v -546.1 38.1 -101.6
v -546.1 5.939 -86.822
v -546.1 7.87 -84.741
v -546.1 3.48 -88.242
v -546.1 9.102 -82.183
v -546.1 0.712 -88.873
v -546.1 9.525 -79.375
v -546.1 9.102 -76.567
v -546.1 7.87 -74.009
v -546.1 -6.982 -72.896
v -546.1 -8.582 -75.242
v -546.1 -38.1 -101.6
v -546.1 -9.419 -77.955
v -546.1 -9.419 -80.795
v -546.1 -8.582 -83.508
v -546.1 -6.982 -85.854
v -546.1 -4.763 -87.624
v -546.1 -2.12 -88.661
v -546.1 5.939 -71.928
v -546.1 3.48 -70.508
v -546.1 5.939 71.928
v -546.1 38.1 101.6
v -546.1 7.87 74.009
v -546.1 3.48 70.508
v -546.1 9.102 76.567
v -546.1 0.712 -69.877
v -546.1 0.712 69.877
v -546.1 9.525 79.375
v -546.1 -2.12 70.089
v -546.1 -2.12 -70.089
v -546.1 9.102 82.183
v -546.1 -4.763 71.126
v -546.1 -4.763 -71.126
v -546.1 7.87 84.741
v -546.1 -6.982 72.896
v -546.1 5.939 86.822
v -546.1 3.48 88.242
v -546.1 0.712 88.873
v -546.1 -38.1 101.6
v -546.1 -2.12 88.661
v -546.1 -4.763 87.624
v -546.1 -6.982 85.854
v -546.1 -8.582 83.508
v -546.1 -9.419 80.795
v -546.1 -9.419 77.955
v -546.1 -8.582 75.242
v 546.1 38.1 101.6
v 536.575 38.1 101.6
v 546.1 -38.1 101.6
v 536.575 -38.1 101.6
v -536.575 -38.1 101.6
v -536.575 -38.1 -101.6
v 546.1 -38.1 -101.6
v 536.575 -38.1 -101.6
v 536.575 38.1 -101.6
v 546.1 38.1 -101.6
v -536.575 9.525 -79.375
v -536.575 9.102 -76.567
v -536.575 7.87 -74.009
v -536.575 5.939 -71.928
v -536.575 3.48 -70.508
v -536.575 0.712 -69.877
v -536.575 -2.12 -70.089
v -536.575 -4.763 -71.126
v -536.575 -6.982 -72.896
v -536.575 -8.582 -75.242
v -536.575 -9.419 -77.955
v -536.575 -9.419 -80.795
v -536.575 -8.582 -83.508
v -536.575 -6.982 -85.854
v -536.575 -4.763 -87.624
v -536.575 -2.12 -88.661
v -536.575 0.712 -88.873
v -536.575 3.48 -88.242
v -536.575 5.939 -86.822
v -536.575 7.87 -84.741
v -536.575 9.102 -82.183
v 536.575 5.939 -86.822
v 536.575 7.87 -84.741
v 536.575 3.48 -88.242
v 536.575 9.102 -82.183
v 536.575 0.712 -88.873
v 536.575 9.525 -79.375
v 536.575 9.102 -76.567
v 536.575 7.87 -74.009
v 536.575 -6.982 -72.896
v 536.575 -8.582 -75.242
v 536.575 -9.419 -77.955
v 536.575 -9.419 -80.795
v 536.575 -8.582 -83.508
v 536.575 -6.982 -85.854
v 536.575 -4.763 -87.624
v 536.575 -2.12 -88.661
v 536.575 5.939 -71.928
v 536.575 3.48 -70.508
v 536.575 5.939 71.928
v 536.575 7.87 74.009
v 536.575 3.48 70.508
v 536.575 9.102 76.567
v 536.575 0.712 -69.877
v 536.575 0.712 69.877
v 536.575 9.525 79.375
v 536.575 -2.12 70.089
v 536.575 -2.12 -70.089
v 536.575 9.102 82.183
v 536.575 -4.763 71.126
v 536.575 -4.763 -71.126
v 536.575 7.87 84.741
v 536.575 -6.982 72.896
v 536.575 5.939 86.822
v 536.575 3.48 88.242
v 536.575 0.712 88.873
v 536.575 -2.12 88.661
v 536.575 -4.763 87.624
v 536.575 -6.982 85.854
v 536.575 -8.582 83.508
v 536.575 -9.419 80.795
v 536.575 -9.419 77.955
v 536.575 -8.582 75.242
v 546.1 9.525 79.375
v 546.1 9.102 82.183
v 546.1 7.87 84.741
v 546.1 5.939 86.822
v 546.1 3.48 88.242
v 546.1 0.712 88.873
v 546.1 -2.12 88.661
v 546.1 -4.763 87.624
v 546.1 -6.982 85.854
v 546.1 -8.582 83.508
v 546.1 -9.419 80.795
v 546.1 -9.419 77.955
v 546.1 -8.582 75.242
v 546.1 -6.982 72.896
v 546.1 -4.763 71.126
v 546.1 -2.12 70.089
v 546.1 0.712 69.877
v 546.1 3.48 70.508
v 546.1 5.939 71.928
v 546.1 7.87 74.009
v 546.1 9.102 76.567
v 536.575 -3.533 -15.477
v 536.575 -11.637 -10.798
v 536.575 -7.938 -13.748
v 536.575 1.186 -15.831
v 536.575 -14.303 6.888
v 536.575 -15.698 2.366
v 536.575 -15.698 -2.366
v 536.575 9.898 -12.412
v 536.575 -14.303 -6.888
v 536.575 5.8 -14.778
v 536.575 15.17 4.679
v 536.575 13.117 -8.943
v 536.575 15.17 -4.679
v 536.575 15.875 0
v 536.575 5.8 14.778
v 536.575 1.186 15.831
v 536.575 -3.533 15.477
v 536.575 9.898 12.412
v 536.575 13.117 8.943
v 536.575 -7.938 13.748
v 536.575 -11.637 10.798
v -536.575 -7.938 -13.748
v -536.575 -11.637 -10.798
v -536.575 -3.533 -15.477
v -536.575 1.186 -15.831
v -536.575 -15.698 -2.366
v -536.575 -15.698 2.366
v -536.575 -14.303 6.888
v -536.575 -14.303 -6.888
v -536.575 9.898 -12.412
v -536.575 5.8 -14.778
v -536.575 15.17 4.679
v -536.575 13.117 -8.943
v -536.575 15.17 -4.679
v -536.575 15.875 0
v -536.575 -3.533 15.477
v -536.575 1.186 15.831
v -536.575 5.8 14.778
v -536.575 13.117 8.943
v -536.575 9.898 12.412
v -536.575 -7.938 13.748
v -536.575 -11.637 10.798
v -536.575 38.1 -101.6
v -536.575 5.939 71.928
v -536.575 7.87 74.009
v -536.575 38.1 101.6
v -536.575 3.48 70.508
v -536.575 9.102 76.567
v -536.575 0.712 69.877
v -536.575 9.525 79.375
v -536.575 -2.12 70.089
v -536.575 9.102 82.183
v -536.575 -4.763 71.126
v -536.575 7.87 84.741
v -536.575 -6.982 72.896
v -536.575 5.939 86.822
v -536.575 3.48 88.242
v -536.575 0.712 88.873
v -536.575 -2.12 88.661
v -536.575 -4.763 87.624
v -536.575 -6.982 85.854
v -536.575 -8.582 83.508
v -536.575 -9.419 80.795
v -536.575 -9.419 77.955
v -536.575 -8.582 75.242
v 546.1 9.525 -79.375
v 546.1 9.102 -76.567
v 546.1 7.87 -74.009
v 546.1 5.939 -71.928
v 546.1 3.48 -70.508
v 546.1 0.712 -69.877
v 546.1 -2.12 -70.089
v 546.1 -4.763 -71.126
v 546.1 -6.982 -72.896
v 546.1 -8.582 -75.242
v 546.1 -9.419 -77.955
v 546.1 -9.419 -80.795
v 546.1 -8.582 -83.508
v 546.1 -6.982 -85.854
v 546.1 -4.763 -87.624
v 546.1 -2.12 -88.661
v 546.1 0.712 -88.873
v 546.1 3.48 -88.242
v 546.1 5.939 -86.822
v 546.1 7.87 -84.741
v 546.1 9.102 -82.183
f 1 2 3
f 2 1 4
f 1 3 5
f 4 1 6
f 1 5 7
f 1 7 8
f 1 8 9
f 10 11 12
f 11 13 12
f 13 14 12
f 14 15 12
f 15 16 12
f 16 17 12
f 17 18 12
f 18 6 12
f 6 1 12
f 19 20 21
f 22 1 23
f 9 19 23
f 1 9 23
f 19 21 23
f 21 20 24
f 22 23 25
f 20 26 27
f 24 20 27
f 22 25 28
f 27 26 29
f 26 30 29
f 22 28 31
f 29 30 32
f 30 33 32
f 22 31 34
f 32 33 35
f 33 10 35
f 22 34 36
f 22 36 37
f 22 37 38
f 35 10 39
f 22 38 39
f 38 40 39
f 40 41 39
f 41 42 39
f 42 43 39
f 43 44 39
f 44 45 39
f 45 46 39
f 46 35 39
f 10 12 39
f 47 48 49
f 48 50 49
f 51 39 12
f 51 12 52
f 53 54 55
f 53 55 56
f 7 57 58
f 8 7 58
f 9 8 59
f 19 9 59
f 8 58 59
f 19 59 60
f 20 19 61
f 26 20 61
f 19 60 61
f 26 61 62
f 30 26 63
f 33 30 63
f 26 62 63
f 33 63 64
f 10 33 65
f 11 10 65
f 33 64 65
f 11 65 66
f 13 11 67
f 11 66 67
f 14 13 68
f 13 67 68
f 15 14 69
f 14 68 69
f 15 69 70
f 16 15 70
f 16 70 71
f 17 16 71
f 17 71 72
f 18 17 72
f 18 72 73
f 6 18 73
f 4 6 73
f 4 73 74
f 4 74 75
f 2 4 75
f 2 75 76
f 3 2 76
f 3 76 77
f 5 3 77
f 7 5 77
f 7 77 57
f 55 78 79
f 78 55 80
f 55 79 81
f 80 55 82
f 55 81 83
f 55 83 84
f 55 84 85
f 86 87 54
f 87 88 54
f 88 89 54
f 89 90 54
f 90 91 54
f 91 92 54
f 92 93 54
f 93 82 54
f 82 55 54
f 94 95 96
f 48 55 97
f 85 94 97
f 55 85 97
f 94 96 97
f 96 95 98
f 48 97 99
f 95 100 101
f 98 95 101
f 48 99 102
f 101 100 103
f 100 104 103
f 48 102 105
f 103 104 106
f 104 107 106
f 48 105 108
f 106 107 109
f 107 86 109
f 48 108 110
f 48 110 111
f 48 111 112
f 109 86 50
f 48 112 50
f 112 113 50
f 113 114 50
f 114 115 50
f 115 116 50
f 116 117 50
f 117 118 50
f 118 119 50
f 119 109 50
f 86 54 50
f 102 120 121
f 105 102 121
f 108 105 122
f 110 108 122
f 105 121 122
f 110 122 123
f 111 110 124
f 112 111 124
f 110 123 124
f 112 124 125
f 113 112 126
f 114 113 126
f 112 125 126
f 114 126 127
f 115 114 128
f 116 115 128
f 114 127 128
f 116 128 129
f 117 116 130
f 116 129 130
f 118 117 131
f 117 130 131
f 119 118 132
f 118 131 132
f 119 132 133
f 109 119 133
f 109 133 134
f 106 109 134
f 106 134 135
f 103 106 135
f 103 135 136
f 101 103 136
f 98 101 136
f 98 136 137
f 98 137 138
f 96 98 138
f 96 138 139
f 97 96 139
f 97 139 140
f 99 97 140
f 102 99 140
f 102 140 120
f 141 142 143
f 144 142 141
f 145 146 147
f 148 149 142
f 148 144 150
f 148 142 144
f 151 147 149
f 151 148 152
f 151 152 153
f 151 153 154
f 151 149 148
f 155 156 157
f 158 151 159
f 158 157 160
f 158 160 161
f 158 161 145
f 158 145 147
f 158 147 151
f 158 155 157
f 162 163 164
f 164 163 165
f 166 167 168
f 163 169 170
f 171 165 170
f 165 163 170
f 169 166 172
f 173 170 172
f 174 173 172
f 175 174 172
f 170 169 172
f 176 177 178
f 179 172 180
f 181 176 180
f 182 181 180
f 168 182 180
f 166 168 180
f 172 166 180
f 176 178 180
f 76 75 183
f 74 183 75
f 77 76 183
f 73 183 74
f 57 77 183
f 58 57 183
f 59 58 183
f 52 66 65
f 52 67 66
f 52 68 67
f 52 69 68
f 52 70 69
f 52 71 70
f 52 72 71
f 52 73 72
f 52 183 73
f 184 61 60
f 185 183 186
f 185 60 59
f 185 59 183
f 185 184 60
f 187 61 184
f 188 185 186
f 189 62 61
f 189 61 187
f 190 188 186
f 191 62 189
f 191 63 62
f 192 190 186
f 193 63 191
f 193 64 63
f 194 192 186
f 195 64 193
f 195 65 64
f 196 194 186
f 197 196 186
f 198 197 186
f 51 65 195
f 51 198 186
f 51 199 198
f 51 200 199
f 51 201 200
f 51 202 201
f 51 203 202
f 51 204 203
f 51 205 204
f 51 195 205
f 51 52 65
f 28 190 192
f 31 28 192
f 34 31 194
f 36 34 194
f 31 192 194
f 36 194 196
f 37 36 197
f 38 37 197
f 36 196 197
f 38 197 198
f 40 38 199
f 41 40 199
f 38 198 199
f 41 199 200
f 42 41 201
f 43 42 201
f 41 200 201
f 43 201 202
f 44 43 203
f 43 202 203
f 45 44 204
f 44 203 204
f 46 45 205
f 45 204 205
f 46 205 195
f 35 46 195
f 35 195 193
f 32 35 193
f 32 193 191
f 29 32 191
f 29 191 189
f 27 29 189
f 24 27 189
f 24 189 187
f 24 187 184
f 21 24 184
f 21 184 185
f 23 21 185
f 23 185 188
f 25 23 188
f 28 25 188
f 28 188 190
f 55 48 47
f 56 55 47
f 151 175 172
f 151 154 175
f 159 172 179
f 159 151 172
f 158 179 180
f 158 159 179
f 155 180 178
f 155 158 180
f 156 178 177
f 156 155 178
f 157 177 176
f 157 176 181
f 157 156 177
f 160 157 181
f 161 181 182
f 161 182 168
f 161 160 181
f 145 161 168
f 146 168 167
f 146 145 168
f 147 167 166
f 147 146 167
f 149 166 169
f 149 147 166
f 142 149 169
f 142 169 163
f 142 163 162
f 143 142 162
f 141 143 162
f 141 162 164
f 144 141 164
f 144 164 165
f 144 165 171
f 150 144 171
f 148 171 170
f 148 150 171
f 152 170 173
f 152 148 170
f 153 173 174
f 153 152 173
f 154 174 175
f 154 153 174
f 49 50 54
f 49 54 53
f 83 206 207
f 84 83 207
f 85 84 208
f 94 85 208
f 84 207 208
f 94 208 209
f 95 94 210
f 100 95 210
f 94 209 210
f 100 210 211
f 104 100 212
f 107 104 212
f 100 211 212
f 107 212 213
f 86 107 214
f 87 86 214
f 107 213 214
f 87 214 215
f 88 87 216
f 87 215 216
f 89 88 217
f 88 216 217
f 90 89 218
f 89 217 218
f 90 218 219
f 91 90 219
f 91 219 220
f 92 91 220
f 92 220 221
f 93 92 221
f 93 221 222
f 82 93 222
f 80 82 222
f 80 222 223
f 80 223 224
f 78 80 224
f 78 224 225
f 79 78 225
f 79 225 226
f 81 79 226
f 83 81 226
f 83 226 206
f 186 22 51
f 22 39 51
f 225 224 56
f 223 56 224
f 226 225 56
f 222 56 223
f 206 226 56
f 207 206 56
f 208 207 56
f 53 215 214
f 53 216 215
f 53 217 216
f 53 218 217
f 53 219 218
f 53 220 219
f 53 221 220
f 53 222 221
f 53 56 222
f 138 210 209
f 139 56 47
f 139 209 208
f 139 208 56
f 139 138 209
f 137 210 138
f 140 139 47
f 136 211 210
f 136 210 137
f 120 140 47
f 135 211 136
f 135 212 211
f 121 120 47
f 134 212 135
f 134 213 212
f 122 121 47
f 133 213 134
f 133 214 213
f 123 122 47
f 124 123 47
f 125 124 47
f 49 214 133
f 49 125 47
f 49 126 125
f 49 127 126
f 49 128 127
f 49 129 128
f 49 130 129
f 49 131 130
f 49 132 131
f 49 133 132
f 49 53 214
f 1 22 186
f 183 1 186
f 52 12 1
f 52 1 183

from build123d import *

# Parameters (mm, degrees)
F0_W          = 9.525
F0_H          = 203.2
F1_DEPTH      = 38.1
F1_DEPTH_BACK = 38.1
F2_R          = 15.875
F3_DEPTH      = 536.575
F3_DEPTH_BACK = 536.575
F4_R          = 9.525
F5_DEPTH      = 1092.201


with BuildPart() as f1:
    # F0 (on Front) → F1 (new body, two sides)
    with BuildSketch(Plane.XZ) as f1_sk:
        with Locations((-541.3375, 0)):
            Rectangle(F0_W, F0_H)
        with Locations((541.3375, 0)):
            Rectangle(F0_W, F0_H)
    extrude(amount=F1_DEPTH)
    extrude(f1_sk.sketch, amount=-F1_DEPTH_BACK)

    # F4 (on face) → F5 (cut, through all)
    with BuildSketch(Plane.YZ.offset(546.1)):
        with Locations((0, -79.375)):
            Circle(F4_R)
        with Locations((0, 79.375)):
            Circle(F4_R)
    extrude(amount=-F5_DEPTH, mode=Mode.SUBTRACT)


with BuildPart() as f3:
    # F2 (on Right) → F3 (new body, two sides)
    with BuildSketch(Plane.YZ) as f3_sk:
        Circle(F2_R)
    extrude(amount=F3_DEPTH)
    extrude(f3_sk.sketch, amount=-F3_DEPTH_BACK)


solid = Compound([f1.part, f3.part])
